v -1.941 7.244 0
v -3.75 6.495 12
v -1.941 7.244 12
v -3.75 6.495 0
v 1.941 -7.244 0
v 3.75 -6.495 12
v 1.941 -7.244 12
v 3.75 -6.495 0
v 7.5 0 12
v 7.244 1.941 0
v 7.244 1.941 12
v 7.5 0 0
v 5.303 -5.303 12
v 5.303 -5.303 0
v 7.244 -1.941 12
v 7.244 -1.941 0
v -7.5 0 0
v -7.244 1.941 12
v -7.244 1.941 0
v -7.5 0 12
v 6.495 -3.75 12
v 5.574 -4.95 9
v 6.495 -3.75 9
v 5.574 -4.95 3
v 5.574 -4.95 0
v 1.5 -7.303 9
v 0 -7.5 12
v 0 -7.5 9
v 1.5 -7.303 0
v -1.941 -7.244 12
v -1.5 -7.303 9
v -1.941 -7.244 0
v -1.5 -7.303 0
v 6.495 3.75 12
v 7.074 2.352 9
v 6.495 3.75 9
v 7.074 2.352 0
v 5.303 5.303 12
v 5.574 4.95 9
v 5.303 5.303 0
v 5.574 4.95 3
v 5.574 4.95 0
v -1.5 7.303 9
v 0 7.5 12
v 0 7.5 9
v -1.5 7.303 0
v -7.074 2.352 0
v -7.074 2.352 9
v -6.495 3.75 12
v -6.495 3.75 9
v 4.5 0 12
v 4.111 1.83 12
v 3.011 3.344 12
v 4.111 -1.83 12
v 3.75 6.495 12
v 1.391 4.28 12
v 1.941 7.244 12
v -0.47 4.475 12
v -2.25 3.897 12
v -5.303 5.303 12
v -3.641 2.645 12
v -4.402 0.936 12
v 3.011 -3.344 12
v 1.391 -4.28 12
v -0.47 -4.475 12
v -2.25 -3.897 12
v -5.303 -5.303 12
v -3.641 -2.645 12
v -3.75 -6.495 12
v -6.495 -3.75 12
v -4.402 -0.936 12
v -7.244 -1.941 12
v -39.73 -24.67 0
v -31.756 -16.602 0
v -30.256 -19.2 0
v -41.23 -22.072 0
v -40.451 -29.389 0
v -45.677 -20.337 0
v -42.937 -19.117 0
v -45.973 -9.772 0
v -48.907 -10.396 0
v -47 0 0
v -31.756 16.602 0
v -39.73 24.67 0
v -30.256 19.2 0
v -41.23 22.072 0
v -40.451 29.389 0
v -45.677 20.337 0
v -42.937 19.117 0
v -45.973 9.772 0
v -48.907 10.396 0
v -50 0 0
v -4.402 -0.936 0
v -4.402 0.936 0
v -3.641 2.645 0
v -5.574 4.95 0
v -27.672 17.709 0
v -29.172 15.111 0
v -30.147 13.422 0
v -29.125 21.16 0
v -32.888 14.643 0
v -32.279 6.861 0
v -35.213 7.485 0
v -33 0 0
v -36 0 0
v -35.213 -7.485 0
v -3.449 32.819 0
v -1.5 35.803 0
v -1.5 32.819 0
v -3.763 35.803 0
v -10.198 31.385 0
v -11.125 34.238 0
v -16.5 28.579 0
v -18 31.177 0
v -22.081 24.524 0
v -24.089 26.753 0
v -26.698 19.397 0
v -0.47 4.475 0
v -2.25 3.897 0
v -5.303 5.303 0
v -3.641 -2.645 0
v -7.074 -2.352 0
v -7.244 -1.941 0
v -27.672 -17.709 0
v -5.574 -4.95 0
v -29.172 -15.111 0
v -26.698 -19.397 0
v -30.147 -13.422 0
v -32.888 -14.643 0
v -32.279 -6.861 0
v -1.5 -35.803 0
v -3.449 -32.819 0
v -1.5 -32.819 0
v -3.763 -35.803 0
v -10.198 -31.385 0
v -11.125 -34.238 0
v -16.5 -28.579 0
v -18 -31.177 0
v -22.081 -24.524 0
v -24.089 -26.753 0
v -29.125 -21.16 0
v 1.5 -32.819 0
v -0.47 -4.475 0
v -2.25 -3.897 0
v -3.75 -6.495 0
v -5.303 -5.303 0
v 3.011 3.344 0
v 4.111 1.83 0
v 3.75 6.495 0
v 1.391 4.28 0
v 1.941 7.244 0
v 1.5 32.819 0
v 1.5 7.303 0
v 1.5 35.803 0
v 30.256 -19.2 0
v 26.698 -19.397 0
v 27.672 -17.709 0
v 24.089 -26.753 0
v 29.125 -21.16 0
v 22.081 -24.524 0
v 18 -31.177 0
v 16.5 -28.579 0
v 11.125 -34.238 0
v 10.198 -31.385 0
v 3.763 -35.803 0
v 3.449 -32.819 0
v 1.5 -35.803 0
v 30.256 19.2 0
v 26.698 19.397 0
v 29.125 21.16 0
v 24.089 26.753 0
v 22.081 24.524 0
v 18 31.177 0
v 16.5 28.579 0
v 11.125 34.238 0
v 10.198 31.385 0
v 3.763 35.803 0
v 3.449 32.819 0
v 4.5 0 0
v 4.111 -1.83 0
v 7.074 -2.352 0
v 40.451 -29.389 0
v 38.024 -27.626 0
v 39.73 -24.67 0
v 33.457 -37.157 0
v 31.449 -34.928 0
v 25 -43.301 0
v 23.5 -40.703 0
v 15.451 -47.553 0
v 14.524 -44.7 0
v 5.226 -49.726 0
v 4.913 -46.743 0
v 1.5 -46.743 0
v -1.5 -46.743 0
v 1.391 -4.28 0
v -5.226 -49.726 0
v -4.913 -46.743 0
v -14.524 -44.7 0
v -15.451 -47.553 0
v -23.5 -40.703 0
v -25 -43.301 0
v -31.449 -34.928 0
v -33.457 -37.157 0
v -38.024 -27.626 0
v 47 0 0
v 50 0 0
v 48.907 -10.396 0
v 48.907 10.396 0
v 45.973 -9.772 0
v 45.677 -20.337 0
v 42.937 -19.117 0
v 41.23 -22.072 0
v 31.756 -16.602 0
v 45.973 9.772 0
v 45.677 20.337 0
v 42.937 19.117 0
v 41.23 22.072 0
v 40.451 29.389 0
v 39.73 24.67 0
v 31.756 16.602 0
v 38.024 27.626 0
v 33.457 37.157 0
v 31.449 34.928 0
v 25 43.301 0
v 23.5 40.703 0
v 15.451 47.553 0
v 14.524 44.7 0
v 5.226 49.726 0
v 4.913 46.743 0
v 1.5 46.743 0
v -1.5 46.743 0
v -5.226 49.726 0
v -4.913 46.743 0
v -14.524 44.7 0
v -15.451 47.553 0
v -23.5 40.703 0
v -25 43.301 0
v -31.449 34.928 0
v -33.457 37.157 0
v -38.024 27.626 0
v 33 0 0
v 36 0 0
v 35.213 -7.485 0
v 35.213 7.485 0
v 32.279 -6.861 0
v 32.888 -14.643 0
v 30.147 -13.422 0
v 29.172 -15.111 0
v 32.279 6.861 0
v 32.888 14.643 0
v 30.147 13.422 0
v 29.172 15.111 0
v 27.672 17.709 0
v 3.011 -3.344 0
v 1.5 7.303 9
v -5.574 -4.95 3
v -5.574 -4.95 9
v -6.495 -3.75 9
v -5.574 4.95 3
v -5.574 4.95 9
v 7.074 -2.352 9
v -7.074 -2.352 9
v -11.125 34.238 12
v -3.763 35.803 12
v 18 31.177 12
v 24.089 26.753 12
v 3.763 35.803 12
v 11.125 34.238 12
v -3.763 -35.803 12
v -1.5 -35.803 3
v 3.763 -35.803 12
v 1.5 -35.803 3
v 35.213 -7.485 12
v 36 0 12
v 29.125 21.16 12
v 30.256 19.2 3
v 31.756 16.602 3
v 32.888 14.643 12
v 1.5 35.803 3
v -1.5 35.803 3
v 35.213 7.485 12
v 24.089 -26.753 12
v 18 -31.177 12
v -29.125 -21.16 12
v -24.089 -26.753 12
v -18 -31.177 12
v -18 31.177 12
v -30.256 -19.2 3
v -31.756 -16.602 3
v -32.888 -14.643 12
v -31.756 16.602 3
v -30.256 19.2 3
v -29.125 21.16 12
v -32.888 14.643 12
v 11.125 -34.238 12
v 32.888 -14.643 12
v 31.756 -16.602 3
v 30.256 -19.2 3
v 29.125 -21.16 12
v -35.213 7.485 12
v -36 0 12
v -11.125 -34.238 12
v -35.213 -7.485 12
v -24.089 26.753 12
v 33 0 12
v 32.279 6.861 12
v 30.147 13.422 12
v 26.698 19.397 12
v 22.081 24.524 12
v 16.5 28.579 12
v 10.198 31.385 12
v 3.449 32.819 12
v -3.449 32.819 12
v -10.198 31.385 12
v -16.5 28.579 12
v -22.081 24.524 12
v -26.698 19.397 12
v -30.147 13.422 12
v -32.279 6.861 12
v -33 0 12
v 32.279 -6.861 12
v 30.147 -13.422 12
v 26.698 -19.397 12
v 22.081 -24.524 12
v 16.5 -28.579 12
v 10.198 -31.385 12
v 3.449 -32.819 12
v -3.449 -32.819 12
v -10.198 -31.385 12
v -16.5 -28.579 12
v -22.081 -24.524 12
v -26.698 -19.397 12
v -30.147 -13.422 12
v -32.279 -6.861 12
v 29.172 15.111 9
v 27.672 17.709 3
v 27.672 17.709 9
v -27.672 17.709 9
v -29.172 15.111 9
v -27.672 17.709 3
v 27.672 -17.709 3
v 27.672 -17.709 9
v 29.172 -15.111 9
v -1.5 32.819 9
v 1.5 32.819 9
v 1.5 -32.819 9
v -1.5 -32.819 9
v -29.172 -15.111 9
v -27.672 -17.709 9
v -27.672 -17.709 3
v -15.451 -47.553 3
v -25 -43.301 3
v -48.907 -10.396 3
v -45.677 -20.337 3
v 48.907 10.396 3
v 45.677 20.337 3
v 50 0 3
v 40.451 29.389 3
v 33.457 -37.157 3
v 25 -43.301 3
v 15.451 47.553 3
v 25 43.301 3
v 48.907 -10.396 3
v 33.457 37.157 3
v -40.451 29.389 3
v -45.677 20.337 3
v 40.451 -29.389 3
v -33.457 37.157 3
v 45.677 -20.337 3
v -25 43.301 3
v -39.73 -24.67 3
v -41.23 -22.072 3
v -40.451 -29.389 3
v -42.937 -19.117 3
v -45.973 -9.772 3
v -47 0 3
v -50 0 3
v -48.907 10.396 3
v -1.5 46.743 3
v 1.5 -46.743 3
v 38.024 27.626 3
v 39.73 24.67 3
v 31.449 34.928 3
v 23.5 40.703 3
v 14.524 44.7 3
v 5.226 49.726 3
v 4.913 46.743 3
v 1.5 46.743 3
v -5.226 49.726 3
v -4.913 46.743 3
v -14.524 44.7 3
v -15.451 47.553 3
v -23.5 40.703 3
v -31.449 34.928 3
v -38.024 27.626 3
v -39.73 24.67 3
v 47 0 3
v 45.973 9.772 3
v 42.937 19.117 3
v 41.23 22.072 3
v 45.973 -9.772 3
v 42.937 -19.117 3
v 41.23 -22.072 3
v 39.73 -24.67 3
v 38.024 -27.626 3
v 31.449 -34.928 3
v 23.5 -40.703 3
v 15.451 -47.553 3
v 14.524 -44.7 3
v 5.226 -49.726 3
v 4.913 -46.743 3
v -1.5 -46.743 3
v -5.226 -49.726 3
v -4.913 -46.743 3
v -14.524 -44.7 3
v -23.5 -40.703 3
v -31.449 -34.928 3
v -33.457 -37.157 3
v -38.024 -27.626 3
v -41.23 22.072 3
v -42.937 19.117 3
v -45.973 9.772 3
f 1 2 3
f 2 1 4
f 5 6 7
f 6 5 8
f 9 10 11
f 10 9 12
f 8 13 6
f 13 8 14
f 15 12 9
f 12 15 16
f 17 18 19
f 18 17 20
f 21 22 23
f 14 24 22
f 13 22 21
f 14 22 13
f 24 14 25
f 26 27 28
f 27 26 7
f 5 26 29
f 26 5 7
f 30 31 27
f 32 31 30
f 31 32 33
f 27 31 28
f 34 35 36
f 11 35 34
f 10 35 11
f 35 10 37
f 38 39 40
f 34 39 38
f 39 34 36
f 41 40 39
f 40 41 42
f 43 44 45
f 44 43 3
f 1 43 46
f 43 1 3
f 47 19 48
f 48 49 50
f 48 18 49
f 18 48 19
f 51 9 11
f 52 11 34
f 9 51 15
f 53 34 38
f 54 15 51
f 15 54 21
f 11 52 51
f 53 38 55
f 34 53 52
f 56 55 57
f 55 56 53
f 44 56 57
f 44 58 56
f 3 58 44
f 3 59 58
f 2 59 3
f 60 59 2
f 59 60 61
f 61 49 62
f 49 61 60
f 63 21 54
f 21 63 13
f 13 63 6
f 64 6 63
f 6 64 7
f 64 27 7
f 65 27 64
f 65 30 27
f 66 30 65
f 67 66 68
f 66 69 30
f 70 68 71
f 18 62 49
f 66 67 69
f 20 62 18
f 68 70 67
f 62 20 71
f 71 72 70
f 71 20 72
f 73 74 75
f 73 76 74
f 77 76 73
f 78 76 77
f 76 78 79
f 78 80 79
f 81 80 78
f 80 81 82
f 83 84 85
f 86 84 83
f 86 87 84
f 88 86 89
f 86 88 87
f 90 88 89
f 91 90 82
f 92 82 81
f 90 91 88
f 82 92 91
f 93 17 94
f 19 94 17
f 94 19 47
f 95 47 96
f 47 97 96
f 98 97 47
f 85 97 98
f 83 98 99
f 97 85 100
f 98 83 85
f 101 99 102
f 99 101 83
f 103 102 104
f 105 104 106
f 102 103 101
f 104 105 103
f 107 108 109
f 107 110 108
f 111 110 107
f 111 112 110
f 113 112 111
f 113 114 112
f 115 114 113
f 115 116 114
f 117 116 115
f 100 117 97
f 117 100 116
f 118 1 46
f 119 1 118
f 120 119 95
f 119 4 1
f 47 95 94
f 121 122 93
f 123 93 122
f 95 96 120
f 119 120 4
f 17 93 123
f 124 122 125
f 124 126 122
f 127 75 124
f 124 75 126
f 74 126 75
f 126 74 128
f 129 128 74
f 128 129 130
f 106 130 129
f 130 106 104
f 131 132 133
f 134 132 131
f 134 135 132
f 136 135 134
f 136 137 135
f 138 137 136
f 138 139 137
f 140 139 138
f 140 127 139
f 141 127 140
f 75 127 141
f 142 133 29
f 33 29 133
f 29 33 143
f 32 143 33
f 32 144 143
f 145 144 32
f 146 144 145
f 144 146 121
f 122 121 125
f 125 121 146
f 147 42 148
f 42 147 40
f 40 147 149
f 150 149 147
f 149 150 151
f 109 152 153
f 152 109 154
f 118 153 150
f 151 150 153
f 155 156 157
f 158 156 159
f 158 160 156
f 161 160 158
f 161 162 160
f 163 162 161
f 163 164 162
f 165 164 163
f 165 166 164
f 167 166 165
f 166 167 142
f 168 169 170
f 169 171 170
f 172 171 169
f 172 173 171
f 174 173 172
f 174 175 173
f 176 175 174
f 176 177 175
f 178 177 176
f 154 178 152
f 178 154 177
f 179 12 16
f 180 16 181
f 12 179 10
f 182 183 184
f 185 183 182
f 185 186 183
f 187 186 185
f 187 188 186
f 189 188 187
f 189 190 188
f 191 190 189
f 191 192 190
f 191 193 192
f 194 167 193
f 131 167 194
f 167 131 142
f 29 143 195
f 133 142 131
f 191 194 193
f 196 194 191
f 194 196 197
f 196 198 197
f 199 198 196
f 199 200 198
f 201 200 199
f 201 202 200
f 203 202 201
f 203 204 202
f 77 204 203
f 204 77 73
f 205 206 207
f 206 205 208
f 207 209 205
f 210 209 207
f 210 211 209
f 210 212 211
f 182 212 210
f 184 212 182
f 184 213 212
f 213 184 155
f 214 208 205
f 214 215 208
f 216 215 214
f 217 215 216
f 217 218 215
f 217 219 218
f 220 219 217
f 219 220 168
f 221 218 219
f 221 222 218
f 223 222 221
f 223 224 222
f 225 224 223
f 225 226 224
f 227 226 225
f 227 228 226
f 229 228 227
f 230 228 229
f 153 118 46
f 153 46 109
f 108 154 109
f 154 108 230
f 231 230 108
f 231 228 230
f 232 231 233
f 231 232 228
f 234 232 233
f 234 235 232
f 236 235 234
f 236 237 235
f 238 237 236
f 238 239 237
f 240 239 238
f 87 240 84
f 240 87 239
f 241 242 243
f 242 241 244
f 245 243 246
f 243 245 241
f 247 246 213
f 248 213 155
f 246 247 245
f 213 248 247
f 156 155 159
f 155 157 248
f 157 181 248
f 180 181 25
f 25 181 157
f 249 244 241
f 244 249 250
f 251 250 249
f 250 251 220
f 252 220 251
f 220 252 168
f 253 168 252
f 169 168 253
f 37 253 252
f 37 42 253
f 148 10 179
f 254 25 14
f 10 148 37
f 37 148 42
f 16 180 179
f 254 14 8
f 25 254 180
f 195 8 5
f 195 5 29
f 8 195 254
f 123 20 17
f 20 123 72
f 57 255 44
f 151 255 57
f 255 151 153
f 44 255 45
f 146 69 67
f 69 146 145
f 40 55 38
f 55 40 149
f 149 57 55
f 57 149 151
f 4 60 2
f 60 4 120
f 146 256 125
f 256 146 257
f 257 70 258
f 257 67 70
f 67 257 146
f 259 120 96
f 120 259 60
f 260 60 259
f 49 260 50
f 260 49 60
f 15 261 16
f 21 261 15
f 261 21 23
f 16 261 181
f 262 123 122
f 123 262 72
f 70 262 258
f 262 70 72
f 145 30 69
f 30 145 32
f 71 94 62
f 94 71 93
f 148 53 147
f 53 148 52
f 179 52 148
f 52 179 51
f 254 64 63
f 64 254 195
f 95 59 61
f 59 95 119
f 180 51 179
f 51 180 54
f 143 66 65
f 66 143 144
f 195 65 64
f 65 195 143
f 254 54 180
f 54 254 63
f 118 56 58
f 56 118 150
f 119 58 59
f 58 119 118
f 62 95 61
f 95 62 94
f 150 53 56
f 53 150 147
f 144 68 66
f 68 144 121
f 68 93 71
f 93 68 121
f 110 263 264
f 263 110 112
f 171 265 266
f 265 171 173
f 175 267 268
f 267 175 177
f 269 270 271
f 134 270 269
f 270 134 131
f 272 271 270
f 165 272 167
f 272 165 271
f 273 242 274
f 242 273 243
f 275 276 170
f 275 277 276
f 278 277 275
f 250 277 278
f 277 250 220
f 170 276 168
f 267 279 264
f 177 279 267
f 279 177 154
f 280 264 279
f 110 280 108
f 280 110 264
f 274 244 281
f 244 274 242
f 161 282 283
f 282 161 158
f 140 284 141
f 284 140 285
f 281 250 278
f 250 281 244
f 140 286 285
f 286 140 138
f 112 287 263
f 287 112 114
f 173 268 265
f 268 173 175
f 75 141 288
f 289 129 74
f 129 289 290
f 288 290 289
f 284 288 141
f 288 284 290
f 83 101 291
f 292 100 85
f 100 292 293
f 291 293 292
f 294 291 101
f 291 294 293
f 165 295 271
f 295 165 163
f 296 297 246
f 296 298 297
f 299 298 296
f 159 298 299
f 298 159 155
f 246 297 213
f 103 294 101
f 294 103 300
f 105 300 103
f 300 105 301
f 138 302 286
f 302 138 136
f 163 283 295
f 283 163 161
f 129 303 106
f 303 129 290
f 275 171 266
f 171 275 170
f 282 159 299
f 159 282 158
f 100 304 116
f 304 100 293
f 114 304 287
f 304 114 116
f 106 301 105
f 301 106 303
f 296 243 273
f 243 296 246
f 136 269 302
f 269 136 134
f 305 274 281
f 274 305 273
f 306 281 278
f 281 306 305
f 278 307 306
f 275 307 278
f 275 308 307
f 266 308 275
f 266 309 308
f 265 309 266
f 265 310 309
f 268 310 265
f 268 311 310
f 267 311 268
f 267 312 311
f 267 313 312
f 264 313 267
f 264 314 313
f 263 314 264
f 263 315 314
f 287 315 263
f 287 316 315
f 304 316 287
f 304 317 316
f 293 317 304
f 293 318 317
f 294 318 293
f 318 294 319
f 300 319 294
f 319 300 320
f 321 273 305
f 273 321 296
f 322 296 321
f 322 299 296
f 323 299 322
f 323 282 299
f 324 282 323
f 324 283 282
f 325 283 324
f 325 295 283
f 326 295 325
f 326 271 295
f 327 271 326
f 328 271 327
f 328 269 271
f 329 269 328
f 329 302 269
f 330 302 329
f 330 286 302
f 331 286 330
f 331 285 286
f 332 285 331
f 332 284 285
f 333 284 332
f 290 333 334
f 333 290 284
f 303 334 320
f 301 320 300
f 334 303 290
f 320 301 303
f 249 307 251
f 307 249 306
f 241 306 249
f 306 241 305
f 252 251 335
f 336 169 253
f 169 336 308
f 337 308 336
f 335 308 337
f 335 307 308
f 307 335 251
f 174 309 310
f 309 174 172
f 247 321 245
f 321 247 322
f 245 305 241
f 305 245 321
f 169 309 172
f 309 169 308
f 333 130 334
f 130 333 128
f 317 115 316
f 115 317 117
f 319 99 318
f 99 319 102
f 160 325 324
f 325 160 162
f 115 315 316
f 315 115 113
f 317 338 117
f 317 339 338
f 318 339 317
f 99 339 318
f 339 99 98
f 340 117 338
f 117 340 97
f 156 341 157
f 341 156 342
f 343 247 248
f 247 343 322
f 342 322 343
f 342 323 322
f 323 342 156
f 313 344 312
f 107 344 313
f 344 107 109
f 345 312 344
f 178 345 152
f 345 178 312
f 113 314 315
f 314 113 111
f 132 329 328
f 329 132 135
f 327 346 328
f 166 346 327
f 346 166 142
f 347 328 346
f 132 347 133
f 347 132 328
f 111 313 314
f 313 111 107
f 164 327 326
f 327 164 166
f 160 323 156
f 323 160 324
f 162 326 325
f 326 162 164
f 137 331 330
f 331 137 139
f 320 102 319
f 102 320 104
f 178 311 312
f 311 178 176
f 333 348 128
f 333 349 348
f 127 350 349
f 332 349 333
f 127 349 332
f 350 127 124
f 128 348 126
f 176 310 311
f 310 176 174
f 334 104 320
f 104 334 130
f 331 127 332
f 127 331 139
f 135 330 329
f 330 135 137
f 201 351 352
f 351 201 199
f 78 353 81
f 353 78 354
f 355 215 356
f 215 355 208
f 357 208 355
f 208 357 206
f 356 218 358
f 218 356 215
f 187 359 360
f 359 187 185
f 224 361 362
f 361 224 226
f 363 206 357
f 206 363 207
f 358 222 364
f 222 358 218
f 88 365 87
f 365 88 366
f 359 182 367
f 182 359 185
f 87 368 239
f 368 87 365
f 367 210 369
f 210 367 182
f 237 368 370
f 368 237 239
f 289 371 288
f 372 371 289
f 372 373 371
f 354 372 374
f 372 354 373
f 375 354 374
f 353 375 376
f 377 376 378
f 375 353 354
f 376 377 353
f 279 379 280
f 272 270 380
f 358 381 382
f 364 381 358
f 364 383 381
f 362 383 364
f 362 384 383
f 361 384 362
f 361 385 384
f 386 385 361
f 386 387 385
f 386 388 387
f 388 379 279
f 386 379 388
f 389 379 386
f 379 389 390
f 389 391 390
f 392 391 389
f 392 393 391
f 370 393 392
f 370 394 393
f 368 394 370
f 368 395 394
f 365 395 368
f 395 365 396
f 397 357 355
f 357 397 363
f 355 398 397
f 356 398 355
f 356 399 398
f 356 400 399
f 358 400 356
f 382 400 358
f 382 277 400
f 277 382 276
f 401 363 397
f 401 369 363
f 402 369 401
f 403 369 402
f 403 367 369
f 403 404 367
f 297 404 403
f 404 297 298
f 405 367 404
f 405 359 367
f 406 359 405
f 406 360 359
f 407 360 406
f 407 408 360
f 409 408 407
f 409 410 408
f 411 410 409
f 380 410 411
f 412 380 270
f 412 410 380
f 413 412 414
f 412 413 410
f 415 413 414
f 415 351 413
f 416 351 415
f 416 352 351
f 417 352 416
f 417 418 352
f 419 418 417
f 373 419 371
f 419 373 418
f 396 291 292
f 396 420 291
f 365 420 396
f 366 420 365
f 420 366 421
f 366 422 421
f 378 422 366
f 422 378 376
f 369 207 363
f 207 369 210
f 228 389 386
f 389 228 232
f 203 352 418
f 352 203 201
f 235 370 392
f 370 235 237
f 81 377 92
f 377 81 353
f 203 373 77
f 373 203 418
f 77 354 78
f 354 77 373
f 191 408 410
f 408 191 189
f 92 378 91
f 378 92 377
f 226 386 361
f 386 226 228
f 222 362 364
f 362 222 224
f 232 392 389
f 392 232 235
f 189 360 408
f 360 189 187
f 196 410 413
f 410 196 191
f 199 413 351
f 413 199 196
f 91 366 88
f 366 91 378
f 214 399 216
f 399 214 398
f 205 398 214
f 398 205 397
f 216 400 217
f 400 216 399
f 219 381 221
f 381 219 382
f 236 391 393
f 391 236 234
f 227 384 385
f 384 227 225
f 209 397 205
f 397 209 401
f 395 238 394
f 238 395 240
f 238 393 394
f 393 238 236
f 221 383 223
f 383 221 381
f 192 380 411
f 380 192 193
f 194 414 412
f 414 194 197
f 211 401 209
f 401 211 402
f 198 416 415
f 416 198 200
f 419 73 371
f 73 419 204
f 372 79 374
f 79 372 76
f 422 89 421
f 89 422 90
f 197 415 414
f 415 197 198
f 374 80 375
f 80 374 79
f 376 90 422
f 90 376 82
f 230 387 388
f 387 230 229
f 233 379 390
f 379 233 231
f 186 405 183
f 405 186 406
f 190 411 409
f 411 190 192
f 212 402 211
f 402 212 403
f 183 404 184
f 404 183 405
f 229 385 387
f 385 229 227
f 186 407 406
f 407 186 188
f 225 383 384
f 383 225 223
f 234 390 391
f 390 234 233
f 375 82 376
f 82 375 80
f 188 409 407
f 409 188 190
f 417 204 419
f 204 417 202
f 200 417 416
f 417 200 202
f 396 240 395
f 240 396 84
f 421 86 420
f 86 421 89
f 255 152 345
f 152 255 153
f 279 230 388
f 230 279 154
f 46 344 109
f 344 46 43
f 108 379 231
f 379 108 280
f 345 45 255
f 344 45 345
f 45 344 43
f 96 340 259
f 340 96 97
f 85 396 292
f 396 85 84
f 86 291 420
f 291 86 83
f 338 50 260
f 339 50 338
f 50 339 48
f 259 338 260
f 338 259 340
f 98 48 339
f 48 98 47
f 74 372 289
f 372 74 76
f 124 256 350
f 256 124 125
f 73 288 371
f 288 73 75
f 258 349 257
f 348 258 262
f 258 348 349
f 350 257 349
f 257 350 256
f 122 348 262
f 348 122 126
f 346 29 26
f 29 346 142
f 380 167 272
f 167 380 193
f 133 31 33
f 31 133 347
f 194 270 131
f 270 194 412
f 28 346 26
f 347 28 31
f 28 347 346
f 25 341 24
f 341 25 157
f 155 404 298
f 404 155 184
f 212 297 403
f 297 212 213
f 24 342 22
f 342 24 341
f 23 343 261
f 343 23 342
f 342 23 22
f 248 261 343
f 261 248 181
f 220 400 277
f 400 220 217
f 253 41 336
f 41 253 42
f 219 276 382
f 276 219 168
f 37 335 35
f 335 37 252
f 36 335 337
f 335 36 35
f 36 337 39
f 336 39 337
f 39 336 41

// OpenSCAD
rod_radius = 4.5;
inner_radius = 36;
outer_radius = 50;
thickness = 3;


hole_r = (outer_radius - inner_radius - 2 * thickness) / 2;


module ring(radius, width, height) {
	difference () {
		cylinder(r = radius, h = height);
		cylinder(r = radius - width, h = height);
	}
}


//difference () {
//	union () {
//		cylinder(r = outer_radius, h = thickness);
//		cylinder(r = inner_radius, h = thickness * 3);
//	}
//	
//	translate([0, 0, thickness])
//	cylinder(r = inner_radius - thickness, h = thickness * 2);

//	cylinder(r = rod_radius, h = thickness);
	
//	for (i = [0 : 5]) {
//		translate([0, inner_radius + thickness + hole_r, 0])
//		cylinder(r = hole_r, h = thickness);
//	}
//}


ring(rod_radius + thickness, thickness, thickness * 4);

ring(inner_radius, thickness, thickness * 4);

ring(outer_radius, thickness, thickness);

for (i = [0 : 5]) {
	rotate([0, 0, 60 * i])
	translate([-thickness / 2, rod_radius, 0])
	cube([thickness, outer_radius - rod_radius - thickness / 2, thickness]);
	
	rotate([0, 0, 60 * i])
	translate([-thickness / 2, rod_radius, 0])
	cube([thickness, inner_radius - rod_radius - thickness / 2, thickness * 3]);
}
